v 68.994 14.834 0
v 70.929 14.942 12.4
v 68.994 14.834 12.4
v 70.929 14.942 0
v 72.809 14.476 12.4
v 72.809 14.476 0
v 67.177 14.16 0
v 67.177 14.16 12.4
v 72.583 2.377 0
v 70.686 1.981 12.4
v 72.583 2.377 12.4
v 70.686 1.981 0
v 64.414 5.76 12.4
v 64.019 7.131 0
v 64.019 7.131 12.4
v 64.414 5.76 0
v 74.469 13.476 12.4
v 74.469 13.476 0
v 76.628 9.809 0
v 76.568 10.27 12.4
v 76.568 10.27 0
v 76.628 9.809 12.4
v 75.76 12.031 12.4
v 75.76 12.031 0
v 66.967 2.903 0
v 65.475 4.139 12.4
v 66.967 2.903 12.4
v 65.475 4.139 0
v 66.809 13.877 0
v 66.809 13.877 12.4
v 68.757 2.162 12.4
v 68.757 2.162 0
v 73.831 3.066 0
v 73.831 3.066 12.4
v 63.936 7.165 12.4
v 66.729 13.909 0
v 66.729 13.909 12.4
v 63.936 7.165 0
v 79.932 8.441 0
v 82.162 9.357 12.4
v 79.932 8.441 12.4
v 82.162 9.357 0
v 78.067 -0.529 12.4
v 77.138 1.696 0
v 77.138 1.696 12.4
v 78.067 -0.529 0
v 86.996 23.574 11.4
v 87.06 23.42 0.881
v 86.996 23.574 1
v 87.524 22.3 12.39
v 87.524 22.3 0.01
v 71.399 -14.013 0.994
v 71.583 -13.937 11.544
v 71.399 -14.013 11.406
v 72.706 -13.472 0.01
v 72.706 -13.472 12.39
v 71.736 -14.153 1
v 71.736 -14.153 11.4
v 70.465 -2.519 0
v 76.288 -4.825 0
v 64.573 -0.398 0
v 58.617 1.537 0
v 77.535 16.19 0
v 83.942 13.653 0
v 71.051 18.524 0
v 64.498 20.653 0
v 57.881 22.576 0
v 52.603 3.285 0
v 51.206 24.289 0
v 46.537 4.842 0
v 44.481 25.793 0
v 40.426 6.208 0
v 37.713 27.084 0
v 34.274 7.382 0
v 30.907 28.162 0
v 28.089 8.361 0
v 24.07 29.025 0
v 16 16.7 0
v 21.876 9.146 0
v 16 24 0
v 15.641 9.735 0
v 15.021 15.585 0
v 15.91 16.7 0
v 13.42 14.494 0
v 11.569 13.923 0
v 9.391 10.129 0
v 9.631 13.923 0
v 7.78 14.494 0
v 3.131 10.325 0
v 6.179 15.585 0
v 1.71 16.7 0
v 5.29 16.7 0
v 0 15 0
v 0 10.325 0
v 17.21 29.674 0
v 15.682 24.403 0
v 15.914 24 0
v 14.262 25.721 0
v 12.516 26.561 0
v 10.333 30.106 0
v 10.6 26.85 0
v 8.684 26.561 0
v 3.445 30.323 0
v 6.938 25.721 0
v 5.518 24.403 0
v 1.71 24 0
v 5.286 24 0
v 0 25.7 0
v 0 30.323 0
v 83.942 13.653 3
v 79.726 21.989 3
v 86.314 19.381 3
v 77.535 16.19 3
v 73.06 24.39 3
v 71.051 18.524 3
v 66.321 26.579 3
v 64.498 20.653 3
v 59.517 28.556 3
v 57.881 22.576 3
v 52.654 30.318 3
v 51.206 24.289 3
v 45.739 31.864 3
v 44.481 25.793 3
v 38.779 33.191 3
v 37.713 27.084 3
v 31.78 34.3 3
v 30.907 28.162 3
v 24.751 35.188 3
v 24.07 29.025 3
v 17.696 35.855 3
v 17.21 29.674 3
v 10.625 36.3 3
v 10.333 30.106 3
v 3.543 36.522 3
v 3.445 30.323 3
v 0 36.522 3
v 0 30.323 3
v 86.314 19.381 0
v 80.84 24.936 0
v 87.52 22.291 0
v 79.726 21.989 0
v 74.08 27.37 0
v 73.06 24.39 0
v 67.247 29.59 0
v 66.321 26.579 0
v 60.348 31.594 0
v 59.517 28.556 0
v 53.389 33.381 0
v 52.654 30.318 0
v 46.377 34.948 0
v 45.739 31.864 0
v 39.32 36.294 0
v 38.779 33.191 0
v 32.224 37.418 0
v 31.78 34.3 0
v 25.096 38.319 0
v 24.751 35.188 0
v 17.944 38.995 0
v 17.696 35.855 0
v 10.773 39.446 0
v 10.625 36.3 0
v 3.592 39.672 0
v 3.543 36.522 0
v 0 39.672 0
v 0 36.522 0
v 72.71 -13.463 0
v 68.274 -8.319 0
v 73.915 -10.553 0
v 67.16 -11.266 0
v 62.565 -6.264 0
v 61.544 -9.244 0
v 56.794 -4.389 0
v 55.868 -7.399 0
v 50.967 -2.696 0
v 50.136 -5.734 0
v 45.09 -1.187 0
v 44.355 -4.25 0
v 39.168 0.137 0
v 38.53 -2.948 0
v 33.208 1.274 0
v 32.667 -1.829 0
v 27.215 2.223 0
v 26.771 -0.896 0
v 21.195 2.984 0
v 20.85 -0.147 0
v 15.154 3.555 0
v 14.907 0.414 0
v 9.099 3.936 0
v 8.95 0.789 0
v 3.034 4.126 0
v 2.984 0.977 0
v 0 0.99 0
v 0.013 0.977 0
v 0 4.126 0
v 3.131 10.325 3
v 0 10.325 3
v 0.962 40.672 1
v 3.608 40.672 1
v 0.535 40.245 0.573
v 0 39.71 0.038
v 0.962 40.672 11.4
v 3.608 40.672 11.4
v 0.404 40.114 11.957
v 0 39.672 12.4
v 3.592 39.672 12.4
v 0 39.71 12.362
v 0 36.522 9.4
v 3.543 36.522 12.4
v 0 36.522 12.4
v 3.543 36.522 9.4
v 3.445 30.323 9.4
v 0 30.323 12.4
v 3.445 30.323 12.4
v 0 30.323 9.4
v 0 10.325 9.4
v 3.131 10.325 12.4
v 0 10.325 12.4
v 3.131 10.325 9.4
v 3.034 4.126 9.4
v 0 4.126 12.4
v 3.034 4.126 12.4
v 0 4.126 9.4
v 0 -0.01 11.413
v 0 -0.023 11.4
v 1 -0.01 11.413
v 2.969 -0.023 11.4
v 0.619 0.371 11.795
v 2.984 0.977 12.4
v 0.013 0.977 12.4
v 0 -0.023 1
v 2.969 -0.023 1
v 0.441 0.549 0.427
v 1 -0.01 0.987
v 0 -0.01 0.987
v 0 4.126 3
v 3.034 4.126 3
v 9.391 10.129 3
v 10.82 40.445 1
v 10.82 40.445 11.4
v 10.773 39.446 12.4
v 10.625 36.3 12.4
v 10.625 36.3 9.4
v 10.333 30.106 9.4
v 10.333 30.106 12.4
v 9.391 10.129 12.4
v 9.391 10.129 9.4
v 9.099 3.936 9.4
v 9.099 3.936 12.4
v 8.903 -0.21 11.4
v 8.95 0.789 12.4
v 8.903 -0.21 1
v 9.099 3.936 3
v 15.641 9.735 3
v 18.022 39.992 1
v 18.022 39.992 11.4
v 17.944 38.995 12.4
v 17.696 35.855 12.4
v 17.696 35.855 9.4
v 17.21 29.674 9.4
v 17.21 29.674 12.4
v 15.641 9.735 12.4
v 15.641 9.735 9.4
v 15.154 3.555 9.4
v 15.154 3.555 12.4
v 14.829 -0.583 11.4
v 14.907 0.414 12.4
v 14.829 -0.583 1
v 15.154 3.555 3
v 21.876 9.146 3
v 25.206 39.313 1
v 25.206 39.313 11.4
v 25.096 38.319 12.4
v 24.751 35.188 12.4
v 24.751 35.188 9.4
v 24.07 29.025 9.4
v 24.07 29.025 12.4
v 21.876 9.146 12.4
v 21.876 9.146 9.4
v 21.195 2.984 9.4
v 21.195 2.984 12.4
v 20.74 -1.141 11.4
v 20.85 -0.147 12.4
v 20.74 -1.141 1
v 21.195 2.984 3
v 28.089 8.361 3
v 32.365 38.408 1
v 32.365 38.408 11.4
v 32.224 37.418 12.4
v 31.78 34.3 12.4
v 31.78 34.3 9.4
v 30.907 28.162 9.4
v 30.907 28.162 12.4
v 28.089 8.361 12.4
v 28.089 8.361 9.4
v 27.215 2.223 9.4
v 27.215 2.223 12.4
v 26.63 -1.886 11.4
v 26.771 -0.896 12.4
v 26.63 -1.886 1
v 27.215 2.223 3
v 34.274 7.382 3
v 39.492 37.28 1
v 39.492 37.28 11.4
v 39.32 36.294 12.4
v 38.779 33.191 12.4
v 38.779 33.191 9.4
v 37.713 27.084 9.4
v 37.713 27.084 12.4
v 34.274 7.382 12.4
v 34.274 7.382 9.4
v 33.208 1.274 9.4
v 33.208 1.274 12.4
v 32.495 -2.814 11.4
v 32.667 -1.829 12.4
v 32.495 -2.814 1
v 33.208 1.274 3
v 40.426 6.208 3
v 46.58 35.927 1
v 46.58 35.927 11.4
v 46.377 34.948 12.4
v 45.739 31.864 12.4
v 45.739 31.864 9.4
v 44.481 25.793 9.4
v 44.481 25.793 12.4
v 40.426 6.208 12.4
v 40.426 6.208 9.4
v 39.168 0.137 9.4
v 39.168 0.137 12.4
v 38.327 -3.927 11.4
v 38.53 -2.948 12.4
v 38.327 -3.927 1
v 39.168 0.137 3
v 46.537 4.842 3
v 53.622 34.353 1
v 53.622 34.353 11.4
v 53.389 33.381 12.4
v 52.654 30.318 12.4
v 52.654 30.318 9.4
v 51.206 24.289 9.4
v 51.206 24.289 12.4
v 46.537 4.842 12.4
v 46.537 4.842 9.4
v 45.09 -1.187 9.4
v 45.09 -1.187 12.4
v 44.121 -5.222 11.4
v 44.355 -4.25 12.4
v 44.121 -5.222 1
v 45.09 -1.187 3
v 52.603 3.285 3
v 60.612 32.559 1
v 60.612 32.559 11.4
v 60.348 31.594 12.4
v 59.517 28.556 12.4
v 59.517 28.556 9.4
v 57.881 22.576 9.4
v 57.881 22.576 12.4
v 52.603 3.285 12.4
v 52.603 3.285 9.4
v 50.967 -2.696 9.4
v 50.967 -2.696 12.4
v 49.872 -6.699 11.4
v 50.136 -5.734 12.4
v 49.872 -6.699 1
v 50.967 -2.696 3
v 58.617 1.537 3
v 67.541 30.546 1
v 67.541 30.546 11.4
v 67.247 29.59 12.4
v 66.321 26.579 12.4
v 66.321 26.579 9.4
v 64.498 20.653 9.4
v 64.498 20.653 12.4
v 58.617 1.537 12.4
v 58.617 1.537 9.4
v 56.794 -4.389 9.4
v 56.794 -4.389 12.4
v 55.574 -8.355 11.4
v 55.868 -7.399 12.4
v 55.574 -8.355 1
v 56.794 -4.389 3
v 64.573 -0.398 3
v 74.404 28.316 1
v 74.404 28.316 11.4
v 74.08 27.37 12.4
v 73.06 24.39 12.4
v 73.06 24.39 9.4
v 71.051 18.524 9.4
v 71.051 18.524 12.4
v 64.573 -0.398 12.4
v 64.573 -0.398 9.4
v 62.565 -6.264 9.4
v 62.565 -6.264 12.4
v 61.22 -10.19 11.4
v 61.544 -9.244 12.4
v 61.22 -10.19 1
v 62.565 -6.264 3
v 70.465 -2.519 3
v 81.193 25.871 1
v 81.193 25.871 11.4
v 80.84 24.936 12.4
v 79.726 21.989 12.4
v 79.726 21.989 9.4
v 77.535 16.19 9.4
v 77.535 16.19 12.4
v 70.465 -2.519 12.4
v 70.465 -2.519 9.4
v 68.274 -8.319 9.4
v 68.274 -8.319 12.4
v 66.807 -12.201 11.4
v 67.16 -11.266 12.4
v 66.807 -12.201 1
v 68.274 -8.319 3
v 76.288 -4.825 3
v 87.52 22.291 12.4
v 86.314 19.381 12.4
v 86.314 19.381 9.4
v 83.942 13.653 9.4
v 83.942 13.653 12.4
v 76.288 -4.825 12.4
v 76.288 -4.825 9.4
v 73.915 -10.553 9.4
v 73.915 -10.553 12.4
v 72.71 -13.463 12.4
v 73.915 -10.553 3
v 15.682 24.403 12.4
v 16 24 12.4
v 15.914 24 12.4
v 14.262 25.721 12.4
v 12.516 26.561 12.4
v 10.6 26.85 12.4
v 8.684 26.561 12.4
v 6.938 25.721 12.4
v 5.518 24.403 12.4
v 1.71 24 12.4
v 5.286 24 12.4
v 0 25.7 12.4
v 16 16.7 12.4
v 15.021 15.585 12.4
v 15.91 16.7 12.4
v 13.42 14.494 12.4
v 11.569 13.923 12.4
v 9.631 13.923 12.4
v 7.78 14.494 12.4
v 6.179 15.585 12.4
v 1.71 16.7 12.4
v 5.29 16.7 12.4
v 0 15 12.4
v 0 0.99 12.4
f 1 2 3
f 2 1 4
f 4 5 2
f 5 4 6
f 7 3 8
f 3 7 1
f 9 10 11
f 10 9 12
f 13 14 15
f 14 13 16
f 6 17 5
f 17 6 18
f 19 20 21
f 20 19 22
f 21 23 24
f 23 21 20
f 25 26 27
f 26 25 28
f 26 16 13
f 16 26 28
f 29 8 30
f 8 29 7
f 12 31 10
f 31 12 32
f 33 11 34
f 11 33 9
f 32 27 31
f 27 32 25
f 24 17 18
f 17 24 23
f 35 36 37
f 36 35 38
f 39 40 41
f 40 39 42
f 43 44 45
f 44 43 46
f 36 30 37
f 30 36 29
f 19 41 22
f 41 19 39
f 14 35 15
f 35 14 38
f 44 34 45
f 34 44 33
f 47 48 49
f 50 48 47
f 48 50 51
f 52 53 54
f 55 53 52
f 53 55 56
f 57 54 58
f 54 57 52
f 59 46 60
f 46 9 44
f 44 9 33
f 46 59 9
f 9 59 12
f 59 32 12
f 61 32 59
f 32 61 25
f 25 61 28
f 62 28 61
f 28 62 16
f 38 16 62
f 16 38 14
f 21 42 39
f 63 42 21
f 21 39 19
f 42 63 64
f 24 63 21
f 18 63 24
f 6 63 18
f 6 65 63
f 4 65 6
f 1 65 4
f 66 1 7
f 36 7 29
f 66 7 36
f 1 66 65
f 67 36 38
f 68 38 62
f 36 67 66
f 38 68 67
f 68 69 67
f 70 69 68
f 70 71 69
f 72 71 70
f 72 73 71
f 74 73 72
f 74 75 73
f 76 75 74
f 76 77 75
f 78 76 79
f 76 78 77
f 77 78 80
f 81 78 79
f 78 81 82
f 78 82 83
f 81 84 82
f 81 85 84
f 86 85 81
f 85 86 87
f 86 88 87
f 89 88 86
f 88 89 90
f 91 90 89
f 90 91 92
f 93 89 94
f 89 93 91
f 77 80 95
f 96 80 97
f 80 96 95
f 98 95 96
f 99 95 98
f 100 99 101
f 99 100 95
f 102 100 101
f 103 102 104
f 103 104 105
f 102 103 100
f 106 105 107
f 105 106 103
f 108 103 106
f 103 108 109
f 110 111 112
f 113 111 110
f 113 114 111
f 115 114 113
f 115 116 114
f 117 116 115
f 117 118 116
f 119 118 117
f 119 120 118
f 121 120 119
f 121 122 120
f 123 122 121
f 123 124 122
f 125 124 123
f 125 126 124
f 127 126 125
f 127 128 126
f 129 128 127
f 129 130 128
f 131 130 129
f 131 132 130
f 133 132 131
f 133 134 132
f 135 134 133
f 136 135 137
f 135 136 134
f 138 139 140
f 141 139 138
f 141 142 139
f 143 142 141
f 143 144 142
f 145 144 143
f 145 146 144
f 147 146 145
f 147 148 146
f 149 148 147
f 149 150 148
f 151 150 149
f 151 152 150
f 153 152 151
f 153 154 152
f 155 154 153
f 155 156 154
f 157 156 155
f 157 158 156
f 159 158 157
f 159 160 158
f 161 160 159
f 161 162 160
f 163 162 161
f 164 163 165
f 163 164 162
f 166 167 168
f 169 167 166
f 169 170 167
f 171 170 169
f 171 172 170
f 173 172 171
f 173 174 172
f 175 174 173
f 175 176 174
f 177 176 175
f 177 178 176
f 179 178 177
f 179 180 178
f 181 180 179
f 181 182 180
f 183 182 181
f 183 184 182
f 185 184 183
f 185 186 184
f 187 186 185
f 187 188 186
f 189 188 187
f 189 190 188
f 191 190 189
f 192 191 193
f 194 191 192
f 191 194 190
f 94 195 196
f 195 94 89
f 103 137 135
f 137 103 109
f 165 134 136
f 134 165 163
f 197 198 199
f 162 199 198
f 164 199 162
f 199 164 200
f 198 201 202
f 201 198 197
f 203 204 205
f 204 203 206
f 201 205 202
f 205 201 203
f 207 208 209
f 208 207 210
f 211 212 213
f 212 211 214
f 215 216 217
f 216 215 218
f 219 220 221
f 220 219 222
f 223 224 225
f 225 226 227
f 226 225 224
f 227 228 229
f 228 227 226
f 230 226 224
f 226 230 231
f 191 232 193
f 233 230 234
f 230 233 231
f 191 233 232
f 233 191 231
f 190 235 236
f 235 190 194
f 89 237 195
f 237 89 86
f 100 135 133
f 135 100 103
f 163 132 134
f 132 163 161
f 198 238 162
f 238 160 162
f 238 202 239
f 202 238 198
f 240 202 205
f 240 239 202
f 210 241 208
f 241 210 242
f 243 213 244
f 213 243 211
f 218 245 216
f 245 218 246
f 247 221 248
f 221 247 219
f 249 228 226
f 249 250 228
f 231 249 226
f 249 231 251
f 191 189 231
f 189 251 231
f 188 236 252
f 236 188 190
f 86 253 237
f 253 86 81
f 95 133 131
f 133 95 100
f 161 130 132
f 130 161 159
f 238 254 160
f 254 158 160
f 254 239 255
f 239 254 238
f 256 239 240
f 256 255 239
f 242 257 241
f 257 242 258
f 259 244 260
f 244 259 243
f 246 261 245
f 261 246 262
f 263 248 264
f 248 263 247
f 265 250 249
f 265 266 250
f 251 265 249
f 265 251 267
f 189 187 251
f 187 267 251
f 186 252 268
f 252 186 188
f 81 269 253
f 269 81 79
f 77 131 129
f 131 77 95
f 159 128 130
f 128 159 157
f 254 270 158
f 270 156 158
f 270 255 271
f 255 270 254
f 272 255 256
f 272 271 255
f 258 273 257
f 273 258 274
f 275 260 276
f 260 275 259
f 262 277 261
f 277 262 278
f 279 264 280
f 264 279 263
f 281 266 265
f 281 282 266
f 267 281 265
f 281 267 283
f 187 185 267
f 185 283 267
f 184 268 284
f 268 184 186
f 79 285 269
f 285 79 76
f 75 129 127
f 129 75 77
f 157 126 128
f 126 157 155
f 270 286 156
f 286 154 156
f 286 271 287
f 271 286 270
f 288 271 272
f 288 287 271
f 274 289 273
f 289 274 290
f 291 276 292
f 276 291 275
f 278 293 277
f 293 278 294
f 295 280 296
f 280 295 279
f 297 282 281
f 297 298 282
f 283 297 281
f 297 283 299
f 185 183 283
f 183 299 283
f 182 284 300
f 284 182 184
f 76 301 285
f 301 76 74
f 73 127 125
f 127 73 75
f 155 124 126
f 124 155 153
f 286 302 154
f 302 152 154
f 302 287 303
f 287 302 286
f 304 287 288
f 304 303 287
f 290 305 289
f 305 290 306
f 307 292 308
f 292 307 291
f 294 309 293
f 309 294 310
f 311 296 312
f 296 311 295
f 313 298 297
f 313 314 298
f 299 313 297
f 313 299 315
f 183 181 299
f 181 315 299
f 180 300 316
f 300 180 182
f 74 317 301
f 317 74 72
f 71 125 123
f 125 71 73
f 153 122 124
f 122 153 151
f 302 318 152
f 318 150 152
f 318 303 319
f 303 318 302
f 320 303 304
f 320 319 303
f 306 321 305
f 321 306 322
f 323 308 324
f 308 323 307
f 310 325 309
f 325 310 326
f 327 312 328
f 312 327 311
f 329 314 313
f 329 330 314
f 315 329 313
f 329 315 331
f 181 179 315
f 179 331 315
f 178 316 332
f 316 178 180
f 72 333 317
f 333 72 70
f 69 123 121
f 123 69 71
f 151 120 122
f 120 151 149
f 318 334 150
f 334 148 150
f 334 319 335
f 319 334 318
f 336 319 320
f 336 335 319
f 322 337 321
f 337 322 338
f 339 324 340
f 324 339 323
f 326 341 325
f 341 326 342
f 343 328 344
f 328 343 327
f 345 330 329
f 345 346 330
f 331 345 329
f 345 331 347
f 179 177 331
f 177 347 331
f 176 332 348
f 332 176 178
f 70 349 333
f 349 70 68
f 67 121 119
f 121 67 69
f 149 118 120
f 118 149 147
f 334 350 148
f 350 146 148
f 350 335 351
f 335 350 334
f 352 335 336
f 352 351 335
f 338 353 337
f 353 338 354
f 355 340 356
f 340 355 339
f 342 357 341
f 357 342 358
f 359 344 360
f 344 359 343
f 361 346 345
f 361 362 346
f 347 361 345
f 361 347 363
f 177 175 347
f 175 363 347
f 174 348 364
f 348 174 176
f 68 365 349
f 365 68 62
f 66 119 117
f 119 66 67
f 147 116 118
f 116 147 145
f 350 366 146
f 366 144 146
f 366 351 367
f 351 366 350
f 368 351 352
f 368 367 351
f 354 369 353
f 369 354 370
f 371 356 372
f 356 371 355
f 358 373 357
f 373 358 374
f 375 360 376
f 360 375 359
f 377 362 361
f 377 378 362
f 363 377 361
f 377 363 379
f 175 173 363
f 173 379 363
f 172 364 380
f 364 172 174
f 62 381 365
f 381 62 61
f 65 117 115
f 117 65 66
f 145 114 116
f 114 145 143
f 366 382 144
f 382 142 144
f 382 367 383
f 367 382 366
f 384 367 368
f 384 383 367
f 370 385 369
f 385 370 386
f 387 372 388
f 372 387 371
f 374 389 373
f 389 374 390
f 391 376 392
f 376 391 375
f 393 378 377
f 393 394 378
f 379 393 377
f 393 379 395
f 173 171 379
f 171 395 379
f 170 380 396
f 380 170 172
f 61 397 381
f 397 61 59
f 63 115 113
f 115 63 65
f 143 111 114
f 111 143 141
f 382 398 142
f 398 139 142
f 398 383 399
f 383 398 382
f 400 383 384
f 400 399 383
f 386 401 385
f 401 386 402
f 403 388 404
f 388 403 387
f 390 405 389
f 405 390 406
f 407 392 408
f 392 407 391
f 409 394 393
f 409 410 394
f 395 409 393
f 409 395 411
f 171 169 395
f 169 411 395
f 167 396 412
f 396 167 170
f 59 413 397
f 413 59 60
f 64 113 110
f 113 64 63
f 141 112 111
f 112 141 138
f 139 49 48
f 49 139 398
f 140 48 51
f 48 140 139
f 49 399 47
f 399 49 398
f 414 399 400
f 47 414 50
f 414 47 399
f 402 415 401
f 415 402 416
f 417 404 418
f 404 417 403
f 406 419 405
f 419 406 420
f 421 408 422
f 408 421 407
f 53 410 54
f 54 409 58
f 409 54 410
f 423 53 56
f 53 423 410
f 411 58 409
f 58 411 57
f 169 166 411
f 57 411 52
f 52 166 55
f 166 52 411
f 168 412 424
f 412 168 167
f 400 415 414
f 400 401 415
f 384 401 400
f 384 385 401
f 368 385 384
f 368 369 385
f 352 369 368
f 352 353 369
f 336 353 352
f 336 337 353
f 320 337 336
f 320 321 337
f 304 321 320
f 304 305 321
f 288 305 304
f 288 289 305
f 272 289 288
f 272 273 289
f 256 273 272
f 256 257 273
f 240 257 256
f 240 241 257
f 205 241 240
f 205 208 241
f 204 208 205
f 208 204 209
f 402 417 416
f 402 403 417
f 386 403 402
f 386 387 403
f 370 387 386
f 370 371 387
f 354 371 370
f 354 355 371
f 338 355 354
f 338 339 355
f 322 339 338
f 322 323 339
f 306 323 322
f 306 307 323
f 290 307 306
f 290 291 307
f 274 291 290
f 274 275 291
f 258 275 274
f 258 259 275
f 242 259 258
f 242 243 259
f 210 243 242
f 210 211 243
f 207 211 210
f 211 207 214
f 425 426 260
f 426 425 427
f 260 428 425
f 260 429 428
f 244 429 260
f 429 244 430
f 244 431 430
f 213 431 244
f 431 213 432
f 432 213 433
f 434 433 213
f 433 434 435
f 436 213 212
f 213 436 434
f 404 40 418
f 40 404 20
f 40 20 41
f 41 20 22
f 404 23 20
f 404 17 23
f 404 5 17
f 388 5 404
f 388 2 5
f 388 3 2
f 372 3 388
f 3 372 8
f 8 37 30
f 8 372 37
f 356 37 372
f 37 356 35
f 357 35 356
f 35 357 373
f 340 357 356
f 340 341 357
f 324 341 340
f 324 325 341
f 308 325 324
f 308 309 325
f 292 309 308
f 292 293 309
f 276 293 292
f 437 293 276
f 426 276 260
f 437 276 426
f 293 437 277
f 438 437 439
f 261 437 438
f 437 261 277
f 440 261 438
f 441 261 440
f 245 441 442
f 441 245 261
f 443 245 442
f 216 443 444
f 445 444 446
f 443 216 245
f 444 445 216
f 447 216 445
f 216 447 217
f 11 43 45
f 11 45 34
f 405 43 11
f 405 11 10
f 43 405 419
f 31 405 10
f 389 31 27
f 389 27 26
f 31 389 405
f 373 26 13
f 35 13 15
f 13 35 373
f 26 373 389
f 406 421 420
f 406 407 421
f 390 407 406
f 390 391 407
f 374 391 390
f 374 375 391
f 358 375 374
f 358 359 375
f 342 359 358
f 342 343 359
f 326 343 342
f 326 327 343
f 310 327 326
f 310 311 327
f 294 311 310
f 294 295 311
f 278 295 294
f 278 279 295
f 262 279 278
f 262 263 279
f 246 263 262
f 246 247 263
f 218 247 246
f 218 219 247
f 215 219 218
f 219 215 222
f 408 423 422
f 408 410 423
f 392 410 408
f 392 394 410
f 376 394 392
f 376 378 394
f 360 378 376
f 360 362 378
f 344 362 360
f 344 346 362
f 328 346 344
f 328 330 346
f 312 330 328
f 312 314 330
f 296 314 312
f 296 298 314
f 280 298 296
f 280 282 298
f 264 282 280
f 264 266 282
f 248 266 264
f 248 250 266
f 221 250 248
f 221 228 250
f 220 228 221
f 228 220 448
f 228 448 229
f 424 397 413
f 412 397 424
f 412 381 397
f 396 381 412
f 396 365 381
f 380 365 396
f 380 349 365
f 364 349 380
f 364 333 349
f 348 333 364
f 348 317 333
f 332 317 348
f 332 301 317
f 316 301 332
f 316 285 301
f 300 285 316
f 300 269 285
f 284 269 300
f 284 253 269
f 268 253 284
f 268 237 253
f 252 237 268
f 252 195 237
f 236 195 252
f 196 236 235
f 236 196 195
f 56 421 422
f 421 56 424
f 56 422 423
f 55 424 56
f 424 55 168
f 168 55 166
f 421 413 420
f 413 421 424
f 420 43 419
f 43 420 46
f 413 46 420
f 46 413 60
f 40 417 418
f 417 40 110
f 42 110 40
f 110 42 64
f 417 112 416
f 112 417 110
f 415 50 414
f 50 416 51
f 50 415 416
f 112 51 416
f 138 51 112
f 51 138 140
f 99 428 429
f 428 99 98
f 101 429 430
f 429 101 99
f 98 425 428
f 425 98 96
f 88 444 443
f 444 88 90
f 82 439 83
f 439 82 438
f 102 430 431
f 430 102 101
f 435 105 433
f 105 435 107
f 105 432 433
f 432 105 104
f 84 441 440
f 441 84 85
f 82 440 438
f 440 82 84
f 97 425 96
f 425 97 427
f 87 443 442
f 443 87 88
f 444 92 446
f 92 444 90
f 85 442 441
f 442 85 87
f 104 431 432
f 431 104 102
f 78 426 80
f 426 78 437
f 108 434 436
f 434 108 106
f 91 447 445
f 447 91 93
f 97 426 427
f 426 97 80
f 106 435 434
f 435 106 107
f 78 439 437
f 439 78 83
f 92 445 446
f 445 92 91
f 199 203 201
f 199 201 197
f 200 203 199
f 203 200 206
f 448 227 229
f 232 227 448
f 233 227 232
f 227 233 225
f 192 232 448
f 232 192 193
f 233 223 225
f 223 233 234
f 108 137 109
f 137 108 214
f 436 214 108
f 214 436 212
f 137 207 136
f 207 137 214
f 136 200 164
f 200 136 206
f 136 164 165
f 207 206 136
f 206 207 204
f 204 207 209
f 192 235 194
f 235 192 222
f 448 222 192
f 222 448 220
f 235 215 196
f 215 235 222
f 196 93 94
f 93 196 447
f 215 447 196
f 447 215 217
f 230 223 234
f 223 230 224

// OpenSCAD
include <lib/brio.scad>

//brio_straight(LENGTH);
//brio_straight((3/4)*LENGTH);
//brio_straight((1/2)*LENGTH);
//brio_straight((1/4)*LENGTH);
//brio_curved(ROUND_R, 8); // inner radius, Nth part
brio_curved(ROUND_R, 16); // inner radius, Nth part
//brio_bridge();
//brio_cross(LENGTH/2);
//brio_splitter();
//brio_splitter_round();
//brio_support();
//brio_tunnel();
//brio_connector(CONN_LEN);
